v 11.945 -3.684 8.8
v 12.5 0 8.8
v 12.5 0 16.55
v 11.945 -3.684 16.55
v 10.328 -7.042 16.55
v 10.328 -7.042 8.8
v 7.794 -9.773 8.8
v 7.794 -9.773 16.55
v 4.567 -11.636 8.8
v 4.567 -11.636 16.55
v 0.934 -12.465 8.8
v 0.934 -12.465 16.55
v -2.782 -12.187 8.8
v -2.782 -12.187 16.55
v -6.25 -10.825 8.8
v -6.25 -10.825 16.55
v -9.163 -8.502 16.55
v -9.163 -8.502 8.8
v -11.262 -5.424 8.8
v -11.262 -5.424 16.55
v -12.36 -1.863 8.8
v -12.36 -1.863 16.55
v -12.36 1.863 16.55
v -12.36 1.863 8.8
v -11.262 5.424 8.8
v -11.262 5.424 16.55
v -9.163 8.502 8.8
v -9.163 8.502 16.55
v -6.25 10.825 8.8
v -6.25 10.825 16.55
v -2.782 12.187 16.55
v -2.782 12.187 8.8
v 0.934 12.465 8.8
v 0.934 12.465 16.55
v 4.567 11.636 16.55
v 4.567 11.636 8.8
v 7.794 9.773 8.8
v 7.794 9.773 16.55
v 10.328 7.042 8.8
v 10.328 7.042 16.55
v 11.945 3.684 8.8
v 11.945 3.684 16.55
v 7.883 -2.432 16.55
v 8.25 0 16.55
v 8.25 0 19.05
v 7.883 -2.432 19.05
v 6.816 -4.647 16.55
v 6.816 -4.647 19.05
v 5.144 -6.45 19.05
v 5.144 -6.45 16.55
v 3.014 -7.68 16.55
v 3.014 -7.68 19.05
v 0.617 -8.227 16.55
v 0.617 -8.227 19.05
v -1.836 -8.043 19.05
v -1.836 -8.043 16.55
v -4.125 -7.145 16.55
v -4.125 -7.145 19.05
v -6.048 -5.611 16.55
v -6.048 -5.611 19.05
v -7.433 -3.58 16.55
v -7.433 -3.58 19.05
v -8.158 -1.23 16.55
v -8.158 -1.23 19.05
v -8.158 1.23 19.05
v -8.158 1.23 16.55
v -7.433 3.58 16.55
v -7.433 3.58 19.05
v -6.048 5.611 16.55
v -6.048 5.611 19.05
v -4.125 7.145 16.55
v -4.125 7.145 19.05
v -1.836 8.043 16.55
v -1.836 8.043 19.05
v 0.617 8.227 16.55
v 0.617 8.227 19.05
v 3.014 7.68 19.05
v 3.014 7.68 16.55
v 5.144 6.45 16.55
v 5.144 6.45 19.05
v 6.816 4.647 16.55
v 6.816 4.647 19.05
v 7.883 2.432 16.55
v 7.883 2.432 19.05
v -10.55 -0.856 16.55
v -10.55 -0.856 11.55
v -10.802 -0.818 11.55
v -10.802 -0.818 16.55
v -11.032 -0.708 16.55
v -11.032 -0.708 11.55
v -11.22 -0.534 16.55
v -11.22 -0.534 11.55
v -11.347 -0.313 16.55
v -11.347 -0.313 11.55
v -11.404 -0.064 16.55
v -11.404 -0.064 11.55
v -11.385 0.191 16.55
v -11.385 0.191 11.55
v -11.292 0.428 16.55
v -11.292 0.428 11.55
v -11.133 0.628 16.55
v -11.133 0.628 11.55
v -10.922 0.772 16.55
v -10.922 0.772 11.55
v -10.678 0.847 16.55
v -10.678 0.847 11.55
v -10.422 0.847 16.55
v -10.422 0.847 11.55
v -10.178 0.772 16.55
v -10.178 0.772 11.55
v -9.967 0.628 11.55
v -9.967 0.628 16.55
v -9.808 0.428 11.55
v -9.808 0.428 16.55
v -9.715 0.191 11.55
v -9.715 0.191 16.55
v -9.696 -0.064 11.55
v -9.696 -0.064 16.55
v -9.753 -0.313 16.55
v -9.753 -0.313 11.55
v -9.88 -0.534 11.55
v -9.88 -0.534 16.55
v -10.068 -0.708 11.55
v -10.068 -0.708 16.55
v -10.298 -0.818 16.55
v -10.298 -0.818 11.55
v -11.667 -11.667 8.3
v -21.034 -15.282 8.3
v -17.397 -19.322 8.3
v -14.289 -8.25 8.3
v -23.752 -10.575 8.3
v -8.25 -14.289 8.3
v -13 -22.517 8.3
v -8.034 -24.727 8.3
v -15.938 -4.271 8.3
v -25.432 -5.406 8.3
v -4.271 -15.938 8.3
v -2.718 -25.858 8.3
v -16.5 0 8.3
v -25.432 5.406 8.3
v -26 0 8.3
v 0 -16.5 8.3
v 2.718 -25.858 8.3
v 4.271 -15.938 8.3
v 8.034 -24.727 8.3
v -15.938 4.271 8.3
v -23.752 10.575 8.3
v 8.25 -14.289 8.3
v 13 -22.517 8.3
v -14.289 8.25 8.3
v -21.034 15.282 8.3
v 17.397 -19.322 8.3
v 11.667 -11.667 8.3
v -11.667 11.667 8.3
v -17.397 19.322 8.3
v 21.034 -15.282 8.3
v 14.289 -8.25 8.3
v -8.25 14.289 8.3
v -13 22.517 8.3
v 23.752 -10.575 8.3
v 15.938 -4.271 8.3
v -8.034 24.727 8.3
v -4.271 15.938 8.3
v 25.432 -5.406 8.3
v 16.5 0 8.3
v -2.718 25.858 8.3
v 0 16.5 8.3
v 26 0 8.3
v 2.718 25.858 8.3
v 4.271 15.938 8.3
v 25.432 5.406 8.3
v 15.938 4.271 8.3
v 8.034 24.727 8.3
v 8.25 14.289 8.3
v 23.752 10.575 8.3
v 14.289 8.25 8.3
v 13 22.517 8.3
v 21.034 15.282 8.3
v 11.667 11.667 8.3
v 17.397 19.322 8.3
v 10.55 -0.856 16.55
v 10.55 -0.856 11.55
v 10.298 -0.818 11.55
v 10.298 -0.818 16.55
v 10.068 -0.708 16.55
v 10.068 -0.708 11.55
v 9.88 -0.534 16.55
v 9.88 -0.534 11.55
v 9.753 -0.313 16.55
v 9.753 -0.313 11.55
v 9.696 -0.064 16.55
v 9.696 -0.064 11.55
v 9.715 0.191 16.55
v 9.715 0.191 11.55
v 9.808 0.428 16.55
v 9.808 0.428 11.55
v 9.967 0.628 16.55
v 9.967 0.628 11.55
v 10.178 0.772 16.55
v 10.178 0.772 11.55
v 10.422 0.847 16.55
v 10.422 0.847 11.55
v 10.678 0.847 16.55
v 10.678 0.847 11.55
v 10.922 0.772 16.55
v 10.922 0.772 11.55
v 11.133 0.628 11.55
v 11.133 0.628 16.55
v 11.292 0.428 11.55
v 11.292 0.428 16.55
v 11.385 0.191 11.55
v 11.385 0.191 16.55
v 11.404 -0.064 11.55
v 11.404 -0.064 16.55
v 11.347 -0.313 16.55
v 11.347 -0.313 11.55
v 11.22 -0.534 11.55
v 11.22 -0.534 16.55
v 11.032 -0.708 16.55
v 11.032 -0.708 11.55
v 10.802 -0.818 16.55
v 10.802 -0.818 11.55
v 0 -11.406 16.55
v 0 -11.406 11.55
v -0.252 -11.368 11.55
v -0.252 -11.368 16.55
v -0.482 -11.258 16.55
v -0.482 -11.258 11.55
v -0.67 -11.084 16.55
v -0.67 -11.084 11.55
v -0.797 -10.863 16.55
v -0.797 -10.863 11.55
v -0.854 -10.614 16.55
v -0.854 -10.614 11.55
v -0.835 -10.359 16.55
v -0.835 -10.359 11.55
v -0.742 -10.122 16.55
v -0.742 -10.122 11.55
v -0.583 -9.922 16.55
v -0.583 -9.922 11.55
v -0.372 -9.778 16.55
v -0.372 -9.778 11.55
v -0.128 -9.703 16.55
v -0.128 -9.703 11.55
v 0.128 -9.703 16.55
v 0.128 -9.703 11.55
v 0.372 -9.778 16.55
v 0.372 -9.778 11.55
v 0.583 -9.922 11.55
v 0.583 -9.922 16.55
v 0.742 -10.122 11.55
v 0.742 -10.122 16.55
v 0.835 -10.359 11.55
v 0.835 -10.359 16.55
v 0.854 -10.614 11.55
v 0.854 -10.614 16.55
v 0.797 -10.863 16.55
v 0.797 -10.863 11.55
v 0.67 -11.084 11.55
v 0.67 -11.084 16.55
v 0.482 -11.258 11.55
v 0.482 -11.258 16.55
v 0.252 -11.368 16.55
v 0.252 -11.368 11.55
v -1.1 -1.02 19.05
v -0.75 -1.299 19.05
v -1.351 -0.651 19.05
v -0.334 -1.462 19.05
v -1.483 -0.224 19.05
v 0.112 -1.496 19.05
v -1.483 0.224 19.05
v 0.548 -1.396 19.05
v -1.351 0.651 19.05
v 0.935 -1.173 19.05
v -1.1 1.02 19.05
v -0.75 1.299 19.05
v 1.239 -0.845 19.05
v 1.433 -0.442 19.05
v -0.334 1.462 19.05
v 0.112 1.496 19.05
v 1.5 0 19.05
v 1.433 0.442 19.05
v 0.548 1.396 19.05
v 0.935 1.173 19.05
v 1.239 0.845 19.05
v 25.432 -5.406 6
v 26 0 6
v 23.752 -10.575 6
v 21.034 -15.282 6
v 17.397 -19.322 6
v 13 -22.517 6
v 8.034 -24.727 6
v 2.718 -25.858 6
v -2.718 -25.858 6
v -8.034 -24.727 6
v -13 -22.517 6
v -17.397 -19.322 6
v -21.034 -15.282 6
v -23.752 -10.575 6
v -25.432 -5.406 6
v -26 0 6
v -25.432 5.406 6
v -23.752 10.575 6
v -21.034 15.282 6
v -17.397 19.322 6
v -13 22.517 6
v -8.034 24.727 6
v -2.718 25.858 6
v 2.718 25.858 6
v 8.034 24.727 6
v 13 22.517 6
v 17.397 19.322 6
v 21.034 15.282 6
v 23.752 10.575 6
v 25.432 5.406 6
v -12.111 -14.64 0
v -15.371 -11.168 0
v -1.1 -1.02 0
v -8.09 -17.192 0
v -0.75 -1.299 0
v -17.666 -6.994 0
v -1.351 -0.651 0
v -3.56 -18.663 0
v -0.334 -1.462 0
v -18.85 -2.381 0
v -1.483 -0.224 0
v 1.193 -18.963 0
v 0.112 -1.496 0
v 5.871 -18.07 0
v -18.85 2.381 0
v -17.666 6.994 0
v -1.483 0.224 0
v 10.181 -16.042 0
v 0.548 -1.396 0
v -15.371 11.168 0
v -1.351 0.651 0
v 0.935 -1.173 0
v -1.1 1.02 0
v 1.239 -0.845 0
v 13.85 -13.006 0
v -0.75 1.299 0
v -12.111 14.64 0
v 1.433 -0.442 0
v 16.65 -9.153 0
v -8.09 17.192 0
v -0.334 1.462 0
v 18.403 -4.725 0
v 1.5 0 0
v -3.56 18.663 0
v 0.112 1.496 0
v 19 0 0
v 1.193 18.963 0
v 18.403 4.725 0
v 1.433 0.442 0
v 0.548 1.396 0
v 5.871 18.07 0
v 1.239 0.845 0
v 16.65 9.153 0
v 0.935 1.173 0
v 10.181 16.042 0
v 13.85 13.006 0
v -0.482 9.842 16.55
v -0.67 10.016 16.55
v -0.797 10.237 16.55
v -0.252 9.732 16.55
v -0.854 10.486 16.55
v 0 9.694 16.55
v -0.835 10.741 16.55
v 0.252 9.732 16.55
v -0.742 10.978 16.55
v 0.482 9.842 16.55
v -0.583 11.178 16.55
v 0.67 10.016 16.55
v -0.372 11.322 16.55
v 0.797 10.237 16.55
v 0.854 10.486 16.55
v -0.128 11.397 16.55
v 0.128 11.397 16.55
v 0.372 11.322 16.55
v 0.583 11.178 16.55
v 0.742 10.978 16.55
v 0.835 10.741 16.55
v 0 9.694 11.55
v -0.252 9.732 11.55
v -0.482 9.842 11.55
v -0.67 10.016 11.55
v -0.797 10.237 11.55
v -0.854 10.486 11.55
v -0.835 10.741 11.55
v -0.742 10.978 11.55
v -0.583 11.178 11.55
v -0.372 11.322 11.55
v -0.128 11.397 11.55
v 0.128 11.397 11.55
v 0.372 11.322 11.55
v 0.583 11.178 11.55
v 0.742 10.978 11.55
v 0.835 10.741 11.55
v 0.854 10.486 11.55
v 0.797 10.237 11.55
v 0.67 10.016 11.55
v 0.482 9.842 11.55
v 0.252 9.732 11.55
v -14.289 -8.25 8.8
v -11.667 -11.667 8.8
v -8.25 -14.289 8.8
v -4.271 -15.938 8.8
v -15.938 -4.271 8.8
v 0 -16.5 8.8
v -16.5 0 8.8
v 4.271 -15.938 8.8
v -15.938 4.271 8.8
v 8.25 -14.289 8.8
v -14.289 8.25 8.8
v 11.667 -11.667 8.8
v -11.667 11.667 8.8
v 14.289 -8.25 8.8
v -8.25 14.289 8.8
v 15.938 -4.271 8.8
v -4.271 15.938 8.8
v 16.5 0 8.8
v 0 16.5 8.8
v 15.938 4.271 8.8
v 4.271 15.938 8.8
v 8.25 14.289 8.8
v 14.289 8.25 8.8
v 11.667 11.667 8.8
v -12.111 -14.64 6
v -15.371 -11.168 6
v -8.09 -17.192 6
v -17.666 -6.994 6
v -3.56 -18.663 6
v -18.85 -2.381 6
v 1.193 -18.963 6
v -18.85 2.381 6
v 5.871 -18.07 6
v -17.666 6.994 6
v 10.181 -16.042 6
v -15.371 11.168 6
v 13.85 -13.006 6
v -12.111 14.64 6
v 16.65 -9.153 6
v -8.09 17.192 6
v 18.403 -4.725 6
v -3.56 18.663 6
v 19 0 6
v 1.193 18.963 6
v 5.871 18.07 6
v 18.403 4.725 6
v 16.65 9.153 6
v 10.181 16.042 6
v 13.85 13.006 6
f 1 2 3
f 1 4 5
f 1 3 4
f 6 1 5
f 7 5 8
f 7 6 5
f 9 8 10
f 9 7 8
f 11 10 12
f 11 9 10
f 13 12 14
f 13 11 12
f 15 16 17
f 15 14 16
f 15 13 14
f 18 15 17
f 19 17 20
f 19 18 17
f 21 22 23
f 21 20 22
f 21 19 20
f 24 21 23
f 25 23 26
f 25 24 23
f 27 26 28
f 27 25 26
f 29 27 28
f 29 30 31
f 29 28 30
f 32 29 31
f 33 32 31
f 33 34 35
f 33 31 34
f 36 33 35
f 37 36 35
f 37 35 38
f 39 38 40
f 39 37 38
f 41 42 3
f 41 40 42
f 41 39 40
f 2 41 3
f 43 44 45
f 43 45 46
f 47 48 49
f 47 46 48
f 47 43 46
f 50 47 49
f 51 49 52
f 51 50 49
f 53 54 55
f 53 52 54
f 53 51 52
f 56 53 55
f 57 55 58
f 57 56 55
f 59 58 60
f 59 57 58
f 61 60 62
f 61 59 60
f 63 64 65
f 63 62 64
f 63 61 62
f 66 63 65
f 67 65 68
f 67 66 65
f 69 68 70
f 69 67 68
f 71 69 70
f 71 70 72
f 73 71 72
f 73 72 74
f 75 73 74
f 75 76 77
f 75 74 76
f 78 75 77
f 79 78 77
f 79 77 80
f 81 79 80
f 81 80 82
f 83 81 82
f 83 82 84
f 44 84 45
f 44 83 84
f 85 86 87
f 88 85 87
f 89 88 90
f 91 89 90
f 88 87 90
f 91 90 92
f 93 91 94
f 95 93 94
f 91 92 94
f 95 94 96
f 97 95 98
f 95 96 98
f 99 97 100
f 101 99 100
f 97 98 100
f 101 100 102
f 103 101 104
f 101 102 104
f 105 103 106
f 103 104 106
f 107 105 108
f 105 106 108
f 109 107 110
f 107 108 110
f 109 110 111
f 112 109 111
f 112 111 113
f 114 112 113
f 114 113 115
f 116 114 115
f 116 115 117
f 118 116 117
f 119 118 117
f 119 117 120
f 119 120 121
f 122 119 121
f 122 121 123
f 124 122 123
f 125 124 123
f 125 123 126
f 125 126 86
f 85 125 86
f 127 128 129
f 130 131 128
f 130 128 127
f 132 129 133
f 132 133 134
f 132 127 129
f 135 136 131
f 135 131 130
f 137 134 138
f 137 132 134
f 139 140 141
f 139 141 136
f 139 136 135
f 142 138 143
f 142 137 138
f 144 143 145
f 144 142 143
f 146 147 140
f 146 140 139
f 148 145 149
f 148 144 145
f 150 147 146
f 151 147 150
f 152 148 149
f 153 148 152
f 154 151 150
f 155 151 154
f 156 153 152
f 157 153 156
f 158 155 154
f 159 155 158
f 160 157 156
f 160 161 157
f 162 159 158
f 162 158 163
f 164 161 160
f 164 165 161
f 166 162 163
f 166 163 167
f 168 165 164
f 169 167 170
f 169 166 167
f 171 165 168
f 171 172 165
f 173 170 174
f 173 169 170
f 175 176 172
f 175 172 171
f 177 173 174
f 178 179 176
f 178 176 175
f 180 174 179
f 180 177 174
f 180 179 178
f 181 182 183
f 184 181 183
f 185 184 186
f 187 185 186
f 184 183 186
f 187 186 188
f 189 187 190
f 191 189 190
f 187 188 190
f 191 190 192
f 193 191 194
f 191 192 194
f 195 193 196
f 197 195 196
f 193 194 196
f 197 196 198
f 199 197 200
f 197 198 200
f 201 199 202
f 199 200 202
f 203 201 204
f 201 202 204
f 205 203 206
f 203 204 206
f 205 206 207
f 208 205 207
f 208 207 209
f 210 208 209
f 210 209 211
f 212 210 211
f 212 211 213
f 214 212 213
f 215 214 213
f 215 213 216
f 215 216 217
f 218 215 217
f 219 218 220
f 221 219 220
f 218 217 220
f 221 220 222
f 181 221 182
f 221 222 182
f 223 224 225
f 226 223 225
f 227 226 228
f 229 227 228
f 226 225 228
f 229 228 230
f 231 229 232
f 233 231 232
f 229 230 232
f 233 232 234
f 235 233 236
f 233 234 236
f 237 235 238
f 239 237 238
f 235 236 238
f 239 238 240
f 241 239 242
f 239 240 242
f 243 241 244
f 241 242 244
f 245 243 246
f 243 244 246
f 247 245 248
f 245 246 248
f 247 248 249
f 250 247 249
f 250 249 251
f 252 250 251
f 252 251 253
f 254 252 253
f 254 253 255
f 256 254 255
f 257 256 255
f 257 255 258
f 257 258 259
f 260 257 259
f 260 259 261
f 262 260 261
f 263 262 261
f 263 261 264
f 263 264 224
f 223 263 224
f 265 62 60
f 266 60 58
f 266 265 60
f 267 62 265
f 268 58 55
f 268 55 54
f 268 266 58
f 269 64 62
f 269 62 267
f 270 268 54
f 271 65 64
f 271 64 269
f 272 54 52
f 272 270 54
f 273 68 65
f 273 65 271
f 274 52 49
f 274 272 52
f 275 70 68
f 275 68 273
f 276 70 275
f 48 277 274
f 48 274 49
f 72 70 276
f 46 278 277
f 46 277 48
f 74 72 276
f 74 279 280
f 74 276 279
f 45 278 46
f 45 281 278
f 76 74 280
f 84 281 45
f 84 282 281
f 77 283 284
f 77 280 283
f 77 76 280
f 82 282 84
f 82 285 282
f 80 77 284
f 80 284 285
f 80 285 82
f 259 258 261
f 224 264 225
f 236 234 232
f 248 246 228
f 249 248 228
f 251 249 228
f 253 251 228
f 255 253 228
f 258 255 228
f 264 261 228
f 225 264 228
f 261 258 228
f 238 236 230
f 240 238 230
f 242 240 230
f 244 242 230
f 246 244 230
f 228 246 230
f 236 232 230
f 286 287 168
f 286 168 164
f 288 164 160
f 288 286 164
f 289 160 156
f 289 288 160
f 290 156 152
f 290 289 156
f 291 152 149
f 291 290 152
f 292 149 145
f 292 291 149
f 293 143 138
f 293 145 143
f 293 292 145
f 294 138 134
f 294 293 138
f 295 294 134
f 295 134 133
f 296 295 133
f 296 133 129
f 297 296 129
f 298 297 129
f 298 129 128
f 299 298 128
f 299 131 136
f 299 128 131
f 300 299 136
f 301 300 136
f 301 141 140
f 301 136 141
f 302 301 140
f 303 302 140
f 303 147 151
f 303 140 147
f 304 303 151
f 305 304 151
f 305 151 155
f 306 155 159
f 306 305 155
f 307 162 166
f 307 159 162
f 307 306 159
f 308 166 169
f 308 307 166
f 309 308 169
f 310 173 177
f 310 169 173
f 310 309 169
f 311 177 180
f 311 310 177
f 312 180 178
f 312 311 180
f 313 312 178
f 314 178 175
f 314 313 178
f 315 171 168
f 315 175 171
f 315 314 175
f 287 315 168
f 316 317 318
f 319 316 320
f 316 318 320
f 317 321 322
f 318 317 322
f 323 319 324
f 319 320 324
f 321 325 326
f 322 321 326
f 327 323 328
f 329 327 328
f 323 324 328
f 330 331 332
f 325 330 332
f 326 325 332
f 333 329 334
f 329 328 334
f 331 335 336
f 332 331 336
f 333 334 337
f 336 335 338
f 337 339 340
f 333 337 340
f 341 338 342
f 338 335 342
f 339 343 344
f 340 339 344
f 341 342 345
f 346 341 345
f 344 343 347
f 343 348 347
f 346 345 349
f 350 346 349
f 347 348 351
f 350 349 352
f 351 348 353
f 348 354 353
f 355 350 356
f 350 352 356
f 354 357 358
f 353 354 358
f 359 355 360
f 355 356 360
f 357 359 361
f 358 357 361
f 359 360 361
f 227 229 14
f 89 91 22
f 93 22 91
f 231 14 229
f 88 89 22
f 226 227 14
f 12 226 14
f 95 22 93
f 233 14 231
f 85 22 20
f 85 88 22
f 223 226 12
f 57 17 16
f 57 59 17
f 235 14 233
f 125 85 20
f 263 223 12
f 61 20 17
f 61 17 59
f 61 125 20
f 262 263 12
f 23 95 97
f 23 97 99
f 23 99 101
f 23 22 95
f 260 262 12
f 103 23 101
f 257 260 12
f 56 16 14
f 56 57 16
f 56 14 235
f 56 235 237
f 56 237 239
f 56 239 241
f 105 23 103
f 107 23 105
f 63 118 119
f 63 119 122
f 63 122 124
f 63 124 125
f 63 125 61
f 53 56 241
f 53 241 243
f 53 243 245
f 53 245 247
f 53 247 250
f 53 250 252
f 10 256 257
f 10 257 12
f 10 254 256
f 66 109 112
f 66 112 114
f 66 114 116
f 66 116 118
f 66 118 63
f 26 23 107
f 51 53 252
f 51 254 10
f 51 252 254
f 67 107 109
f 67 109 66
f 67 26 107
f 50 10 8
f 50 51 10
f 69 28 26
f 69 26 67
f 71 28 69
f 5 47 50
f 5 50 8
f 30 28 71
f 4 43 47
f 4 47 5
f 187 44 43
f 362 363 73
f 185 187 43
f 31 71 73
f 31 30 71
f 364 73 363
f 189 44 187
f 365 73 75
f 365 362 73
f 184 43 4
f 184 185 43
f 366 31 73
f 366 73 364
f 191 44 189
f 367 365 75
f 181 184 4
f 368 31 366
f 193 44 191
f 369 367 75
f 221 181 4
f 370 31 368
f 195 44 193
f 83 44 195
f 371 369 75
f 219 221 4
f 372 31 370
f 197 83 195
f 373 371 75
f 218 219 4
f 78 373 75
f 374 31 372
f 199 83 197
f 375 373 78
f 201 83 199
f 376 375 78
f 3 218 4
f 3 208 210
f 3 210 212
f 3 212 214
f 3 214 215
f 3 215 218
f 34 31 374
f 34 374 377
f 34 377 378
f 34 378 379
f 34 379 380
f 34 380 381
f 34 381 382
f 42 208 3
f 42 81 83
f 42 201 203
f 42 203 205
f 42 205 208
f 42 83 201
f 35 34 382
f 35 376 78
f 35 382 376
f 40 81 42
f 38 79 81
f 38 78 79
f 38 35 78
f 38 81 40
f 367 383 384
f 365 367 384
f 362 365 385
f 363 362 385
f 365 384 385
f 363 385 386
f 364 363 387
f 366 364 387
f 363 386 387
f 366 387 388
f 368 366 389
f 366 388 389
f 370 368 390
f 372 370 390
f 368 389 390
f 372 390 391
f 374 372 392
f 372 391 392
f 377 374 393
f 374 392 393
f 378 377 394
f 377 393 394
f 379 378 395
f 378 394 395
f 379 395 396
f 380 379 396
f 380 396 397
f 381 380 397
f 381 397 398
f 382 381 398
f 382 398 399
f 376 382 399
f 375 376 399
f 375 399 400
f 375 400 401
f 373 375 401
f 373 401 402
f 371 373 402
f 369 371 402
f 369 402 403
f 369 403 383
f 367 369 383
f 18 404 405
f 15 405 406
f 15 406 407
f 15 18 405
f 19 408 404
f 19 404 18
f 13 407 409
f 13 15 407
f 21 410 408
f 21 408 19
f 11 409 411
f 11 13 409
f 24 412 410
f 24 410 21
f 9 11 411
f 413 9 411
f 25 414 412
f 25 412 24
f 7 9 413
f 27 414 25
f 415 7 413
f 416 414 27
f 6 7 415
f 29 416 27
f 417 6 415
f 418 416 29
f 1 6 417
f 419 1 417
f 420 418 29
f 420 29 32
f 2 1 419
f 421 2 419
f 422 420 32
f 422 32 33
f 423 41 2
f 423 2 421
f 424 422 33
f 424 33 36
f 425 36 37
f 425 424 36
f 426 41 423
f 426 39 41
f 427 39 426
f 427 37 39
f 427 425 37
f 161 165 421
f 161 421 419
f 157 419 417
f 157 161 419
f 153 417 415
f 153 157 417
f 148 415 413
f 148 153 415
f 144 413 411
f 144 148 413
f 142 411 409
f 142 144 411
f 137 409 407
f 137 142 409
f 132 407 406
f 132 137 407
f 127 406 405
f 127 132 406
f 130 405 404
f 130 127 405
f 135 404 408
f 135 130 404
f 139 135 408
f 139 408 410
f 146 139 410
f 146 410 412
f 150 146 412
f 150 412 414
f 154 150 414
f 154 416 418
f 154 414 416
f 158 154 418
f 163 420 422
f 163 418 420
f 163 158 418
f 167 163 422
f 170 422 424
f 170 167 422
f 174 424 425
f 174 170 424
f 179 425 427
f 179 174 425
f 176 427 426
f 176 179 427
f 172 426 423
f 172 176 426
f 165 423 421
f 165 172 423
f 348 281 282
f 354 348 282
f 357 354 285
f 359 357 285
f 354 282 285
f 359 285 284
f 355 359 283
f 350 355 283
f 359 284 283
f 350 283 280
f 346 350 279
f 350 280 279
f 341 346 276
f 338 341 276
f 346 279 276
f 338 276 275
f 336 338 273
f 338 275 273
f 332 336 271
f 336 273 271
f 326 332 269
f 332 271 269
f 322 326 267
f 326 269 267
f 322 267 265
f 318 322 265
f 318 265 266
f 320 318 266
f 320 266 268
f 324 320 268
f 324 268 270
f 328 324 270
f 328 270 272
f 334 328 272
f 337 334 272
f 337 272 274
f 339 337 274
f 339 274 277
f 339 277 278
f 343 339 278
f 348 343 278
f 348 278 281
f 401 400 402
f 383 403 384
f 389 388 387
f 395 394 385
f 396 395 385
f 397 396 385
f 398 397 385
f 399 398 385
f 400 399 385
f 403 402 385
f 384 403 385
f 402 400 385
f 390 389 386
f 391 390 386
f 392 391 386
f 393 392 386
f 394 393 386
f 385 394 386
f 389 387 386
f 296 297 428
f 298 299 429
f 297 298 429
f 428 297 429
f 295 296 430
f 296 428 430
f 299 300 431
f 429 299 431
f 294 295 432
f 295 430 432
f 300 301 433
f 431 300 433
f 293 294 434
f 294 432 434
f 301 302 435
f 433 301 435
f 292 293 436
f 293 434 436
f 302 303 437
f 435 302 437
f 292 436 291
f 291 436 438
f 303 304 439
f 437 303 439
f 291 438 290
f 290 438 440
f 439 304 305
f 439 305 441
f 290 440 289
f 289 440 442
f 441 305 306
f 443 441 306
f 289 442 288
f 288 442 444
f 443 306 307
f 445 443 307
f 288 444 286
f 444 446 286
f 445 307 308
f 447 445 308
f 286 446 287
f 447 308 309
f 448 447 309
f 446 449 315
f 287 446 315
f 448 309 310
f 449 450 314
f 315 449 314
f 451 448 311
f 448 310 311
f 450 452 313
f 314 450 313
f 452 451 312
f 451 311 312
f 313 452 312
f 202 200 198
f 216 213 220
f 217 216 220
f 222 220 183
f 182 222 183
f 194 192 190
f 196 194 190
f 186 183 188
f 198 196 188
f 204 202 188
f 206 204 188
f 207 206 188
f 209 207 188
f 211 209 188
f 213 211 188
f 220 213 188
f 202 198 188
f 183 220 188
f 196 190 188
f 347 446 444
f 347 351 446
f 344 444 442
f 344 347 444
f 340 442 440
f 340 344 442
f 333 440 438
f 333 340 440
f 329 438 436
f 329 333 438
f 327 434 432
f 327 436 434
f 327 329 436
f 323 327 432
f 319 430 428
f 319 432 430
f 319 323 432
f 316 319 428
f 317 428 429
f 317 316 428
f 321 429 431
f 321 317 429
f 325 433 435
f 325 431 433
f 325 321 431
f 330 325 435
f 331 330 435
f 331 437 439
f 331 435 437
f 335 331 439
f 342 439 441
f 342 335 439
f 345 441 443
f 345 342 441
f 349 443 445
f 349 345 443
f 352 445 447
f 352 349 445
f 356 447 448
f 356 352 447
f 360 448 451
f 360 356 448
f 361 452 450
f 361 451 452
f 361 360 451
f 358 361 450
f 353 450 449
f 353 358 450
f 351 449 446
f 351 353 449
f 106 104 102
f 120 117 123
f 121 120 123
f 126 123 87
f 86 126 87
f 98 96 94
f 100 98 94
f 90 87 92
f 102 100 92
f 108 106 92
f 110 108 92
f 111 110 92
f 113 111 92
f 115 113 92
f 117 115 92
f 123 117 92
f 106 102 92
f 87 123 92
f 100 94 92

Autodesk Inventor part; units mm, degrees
ref_plane "YZ Plane" through (0, 0, 0) normal (1, 0, 0) x (0, 1, 0)
ref_plane "XZ Plane" through (0, 0, 0) normal (0, 1, 0) x (-1, 0, 0)
ref_plane "XY Plane" through (0, 0, 0) normal (0, 0, 1) x (1, 0, 0)
sketch "Sketch1" plane through (0, 0, 0) normal (0, 0, 1) x (1, 0, 0)
  circle A0 centre (0, 0) radius 19
  dimension "d0" = 38
extrude "Extrusion1" add sketch "Sketch1" along normal blind 6
sketch "Sketch2" plane through (0, 0, 6) normal (0, 0, 1) x (1, 0, 0)
  circle A0 centre (0, 0) radius 26
  dimension "d3" = 52
extrude "Extrusion2" add sketch "Sketch2" along normal blind 2.3
sketch "Sketch3" plane through (0, 0, 8.3) normal (0, 0, 1) x (1, 0, 0)
  circle A0 centre (0, 0) radius 16.5
  dimension "d6" = 33
extrude "Extrusion3" add sketch "Sketch3" along normal blind 0.5
sketch "Sketch4" plane through (0, 0, 8.8) normal (0, 0, 1) x (1, 0, 0)
  circle A0 centre (0, 0) radius 12.5
  dimension "d9" = 25
extrude "Extrusion4" add sketch "Sketch4" along normal blind 7.75
sketch "Sketch5" plane through (0, 0, 16.55) normal (0, 0, 1) x (1, 0, 0)
  circle A0 centre (0, 0) radius 8.25
  dimension "d12" = 16.5
extrude "Extrusion5" add sketch "Sketch5" along normal blind 2.5
sketch "Sketch6" plane through (0, 0, 16.55) normal (0, 0, 1) x (1, 0, 0)
  line L0 (0, -36.4) -> (0, 36.4) projected
  point P0 (0, 0)
  point P1 (0, 10.55)
  point P2 (-10.55, 0)
  point P3 (0, -10.55)
  point P4 (10.55, 0)
  dimension "d15" = 10.55
  dimension "d18" = 360
hole "Hole1" at (0, 10.55, 16.55) at (-10.55, 0, 16.55) at (0, -10.55, 16.55) at (10.55, 0, 16.55) direction (0, 0, -1) diameter 1.7129 depth 5 thread size "M2.2x0.45" class "6H" standard "ANSI Metric M Profile"
sketch "Sketch7" plane through (0, 0, 19.05) normal (0, 0, 1) x (1, 0, 0)
  circle A0 centre (0, 0) radius 1.5
  dimension "d27" = 3
extrude "Extrusion6" cut sketch "Sketch7" against normal through all
properties part number "motor"
